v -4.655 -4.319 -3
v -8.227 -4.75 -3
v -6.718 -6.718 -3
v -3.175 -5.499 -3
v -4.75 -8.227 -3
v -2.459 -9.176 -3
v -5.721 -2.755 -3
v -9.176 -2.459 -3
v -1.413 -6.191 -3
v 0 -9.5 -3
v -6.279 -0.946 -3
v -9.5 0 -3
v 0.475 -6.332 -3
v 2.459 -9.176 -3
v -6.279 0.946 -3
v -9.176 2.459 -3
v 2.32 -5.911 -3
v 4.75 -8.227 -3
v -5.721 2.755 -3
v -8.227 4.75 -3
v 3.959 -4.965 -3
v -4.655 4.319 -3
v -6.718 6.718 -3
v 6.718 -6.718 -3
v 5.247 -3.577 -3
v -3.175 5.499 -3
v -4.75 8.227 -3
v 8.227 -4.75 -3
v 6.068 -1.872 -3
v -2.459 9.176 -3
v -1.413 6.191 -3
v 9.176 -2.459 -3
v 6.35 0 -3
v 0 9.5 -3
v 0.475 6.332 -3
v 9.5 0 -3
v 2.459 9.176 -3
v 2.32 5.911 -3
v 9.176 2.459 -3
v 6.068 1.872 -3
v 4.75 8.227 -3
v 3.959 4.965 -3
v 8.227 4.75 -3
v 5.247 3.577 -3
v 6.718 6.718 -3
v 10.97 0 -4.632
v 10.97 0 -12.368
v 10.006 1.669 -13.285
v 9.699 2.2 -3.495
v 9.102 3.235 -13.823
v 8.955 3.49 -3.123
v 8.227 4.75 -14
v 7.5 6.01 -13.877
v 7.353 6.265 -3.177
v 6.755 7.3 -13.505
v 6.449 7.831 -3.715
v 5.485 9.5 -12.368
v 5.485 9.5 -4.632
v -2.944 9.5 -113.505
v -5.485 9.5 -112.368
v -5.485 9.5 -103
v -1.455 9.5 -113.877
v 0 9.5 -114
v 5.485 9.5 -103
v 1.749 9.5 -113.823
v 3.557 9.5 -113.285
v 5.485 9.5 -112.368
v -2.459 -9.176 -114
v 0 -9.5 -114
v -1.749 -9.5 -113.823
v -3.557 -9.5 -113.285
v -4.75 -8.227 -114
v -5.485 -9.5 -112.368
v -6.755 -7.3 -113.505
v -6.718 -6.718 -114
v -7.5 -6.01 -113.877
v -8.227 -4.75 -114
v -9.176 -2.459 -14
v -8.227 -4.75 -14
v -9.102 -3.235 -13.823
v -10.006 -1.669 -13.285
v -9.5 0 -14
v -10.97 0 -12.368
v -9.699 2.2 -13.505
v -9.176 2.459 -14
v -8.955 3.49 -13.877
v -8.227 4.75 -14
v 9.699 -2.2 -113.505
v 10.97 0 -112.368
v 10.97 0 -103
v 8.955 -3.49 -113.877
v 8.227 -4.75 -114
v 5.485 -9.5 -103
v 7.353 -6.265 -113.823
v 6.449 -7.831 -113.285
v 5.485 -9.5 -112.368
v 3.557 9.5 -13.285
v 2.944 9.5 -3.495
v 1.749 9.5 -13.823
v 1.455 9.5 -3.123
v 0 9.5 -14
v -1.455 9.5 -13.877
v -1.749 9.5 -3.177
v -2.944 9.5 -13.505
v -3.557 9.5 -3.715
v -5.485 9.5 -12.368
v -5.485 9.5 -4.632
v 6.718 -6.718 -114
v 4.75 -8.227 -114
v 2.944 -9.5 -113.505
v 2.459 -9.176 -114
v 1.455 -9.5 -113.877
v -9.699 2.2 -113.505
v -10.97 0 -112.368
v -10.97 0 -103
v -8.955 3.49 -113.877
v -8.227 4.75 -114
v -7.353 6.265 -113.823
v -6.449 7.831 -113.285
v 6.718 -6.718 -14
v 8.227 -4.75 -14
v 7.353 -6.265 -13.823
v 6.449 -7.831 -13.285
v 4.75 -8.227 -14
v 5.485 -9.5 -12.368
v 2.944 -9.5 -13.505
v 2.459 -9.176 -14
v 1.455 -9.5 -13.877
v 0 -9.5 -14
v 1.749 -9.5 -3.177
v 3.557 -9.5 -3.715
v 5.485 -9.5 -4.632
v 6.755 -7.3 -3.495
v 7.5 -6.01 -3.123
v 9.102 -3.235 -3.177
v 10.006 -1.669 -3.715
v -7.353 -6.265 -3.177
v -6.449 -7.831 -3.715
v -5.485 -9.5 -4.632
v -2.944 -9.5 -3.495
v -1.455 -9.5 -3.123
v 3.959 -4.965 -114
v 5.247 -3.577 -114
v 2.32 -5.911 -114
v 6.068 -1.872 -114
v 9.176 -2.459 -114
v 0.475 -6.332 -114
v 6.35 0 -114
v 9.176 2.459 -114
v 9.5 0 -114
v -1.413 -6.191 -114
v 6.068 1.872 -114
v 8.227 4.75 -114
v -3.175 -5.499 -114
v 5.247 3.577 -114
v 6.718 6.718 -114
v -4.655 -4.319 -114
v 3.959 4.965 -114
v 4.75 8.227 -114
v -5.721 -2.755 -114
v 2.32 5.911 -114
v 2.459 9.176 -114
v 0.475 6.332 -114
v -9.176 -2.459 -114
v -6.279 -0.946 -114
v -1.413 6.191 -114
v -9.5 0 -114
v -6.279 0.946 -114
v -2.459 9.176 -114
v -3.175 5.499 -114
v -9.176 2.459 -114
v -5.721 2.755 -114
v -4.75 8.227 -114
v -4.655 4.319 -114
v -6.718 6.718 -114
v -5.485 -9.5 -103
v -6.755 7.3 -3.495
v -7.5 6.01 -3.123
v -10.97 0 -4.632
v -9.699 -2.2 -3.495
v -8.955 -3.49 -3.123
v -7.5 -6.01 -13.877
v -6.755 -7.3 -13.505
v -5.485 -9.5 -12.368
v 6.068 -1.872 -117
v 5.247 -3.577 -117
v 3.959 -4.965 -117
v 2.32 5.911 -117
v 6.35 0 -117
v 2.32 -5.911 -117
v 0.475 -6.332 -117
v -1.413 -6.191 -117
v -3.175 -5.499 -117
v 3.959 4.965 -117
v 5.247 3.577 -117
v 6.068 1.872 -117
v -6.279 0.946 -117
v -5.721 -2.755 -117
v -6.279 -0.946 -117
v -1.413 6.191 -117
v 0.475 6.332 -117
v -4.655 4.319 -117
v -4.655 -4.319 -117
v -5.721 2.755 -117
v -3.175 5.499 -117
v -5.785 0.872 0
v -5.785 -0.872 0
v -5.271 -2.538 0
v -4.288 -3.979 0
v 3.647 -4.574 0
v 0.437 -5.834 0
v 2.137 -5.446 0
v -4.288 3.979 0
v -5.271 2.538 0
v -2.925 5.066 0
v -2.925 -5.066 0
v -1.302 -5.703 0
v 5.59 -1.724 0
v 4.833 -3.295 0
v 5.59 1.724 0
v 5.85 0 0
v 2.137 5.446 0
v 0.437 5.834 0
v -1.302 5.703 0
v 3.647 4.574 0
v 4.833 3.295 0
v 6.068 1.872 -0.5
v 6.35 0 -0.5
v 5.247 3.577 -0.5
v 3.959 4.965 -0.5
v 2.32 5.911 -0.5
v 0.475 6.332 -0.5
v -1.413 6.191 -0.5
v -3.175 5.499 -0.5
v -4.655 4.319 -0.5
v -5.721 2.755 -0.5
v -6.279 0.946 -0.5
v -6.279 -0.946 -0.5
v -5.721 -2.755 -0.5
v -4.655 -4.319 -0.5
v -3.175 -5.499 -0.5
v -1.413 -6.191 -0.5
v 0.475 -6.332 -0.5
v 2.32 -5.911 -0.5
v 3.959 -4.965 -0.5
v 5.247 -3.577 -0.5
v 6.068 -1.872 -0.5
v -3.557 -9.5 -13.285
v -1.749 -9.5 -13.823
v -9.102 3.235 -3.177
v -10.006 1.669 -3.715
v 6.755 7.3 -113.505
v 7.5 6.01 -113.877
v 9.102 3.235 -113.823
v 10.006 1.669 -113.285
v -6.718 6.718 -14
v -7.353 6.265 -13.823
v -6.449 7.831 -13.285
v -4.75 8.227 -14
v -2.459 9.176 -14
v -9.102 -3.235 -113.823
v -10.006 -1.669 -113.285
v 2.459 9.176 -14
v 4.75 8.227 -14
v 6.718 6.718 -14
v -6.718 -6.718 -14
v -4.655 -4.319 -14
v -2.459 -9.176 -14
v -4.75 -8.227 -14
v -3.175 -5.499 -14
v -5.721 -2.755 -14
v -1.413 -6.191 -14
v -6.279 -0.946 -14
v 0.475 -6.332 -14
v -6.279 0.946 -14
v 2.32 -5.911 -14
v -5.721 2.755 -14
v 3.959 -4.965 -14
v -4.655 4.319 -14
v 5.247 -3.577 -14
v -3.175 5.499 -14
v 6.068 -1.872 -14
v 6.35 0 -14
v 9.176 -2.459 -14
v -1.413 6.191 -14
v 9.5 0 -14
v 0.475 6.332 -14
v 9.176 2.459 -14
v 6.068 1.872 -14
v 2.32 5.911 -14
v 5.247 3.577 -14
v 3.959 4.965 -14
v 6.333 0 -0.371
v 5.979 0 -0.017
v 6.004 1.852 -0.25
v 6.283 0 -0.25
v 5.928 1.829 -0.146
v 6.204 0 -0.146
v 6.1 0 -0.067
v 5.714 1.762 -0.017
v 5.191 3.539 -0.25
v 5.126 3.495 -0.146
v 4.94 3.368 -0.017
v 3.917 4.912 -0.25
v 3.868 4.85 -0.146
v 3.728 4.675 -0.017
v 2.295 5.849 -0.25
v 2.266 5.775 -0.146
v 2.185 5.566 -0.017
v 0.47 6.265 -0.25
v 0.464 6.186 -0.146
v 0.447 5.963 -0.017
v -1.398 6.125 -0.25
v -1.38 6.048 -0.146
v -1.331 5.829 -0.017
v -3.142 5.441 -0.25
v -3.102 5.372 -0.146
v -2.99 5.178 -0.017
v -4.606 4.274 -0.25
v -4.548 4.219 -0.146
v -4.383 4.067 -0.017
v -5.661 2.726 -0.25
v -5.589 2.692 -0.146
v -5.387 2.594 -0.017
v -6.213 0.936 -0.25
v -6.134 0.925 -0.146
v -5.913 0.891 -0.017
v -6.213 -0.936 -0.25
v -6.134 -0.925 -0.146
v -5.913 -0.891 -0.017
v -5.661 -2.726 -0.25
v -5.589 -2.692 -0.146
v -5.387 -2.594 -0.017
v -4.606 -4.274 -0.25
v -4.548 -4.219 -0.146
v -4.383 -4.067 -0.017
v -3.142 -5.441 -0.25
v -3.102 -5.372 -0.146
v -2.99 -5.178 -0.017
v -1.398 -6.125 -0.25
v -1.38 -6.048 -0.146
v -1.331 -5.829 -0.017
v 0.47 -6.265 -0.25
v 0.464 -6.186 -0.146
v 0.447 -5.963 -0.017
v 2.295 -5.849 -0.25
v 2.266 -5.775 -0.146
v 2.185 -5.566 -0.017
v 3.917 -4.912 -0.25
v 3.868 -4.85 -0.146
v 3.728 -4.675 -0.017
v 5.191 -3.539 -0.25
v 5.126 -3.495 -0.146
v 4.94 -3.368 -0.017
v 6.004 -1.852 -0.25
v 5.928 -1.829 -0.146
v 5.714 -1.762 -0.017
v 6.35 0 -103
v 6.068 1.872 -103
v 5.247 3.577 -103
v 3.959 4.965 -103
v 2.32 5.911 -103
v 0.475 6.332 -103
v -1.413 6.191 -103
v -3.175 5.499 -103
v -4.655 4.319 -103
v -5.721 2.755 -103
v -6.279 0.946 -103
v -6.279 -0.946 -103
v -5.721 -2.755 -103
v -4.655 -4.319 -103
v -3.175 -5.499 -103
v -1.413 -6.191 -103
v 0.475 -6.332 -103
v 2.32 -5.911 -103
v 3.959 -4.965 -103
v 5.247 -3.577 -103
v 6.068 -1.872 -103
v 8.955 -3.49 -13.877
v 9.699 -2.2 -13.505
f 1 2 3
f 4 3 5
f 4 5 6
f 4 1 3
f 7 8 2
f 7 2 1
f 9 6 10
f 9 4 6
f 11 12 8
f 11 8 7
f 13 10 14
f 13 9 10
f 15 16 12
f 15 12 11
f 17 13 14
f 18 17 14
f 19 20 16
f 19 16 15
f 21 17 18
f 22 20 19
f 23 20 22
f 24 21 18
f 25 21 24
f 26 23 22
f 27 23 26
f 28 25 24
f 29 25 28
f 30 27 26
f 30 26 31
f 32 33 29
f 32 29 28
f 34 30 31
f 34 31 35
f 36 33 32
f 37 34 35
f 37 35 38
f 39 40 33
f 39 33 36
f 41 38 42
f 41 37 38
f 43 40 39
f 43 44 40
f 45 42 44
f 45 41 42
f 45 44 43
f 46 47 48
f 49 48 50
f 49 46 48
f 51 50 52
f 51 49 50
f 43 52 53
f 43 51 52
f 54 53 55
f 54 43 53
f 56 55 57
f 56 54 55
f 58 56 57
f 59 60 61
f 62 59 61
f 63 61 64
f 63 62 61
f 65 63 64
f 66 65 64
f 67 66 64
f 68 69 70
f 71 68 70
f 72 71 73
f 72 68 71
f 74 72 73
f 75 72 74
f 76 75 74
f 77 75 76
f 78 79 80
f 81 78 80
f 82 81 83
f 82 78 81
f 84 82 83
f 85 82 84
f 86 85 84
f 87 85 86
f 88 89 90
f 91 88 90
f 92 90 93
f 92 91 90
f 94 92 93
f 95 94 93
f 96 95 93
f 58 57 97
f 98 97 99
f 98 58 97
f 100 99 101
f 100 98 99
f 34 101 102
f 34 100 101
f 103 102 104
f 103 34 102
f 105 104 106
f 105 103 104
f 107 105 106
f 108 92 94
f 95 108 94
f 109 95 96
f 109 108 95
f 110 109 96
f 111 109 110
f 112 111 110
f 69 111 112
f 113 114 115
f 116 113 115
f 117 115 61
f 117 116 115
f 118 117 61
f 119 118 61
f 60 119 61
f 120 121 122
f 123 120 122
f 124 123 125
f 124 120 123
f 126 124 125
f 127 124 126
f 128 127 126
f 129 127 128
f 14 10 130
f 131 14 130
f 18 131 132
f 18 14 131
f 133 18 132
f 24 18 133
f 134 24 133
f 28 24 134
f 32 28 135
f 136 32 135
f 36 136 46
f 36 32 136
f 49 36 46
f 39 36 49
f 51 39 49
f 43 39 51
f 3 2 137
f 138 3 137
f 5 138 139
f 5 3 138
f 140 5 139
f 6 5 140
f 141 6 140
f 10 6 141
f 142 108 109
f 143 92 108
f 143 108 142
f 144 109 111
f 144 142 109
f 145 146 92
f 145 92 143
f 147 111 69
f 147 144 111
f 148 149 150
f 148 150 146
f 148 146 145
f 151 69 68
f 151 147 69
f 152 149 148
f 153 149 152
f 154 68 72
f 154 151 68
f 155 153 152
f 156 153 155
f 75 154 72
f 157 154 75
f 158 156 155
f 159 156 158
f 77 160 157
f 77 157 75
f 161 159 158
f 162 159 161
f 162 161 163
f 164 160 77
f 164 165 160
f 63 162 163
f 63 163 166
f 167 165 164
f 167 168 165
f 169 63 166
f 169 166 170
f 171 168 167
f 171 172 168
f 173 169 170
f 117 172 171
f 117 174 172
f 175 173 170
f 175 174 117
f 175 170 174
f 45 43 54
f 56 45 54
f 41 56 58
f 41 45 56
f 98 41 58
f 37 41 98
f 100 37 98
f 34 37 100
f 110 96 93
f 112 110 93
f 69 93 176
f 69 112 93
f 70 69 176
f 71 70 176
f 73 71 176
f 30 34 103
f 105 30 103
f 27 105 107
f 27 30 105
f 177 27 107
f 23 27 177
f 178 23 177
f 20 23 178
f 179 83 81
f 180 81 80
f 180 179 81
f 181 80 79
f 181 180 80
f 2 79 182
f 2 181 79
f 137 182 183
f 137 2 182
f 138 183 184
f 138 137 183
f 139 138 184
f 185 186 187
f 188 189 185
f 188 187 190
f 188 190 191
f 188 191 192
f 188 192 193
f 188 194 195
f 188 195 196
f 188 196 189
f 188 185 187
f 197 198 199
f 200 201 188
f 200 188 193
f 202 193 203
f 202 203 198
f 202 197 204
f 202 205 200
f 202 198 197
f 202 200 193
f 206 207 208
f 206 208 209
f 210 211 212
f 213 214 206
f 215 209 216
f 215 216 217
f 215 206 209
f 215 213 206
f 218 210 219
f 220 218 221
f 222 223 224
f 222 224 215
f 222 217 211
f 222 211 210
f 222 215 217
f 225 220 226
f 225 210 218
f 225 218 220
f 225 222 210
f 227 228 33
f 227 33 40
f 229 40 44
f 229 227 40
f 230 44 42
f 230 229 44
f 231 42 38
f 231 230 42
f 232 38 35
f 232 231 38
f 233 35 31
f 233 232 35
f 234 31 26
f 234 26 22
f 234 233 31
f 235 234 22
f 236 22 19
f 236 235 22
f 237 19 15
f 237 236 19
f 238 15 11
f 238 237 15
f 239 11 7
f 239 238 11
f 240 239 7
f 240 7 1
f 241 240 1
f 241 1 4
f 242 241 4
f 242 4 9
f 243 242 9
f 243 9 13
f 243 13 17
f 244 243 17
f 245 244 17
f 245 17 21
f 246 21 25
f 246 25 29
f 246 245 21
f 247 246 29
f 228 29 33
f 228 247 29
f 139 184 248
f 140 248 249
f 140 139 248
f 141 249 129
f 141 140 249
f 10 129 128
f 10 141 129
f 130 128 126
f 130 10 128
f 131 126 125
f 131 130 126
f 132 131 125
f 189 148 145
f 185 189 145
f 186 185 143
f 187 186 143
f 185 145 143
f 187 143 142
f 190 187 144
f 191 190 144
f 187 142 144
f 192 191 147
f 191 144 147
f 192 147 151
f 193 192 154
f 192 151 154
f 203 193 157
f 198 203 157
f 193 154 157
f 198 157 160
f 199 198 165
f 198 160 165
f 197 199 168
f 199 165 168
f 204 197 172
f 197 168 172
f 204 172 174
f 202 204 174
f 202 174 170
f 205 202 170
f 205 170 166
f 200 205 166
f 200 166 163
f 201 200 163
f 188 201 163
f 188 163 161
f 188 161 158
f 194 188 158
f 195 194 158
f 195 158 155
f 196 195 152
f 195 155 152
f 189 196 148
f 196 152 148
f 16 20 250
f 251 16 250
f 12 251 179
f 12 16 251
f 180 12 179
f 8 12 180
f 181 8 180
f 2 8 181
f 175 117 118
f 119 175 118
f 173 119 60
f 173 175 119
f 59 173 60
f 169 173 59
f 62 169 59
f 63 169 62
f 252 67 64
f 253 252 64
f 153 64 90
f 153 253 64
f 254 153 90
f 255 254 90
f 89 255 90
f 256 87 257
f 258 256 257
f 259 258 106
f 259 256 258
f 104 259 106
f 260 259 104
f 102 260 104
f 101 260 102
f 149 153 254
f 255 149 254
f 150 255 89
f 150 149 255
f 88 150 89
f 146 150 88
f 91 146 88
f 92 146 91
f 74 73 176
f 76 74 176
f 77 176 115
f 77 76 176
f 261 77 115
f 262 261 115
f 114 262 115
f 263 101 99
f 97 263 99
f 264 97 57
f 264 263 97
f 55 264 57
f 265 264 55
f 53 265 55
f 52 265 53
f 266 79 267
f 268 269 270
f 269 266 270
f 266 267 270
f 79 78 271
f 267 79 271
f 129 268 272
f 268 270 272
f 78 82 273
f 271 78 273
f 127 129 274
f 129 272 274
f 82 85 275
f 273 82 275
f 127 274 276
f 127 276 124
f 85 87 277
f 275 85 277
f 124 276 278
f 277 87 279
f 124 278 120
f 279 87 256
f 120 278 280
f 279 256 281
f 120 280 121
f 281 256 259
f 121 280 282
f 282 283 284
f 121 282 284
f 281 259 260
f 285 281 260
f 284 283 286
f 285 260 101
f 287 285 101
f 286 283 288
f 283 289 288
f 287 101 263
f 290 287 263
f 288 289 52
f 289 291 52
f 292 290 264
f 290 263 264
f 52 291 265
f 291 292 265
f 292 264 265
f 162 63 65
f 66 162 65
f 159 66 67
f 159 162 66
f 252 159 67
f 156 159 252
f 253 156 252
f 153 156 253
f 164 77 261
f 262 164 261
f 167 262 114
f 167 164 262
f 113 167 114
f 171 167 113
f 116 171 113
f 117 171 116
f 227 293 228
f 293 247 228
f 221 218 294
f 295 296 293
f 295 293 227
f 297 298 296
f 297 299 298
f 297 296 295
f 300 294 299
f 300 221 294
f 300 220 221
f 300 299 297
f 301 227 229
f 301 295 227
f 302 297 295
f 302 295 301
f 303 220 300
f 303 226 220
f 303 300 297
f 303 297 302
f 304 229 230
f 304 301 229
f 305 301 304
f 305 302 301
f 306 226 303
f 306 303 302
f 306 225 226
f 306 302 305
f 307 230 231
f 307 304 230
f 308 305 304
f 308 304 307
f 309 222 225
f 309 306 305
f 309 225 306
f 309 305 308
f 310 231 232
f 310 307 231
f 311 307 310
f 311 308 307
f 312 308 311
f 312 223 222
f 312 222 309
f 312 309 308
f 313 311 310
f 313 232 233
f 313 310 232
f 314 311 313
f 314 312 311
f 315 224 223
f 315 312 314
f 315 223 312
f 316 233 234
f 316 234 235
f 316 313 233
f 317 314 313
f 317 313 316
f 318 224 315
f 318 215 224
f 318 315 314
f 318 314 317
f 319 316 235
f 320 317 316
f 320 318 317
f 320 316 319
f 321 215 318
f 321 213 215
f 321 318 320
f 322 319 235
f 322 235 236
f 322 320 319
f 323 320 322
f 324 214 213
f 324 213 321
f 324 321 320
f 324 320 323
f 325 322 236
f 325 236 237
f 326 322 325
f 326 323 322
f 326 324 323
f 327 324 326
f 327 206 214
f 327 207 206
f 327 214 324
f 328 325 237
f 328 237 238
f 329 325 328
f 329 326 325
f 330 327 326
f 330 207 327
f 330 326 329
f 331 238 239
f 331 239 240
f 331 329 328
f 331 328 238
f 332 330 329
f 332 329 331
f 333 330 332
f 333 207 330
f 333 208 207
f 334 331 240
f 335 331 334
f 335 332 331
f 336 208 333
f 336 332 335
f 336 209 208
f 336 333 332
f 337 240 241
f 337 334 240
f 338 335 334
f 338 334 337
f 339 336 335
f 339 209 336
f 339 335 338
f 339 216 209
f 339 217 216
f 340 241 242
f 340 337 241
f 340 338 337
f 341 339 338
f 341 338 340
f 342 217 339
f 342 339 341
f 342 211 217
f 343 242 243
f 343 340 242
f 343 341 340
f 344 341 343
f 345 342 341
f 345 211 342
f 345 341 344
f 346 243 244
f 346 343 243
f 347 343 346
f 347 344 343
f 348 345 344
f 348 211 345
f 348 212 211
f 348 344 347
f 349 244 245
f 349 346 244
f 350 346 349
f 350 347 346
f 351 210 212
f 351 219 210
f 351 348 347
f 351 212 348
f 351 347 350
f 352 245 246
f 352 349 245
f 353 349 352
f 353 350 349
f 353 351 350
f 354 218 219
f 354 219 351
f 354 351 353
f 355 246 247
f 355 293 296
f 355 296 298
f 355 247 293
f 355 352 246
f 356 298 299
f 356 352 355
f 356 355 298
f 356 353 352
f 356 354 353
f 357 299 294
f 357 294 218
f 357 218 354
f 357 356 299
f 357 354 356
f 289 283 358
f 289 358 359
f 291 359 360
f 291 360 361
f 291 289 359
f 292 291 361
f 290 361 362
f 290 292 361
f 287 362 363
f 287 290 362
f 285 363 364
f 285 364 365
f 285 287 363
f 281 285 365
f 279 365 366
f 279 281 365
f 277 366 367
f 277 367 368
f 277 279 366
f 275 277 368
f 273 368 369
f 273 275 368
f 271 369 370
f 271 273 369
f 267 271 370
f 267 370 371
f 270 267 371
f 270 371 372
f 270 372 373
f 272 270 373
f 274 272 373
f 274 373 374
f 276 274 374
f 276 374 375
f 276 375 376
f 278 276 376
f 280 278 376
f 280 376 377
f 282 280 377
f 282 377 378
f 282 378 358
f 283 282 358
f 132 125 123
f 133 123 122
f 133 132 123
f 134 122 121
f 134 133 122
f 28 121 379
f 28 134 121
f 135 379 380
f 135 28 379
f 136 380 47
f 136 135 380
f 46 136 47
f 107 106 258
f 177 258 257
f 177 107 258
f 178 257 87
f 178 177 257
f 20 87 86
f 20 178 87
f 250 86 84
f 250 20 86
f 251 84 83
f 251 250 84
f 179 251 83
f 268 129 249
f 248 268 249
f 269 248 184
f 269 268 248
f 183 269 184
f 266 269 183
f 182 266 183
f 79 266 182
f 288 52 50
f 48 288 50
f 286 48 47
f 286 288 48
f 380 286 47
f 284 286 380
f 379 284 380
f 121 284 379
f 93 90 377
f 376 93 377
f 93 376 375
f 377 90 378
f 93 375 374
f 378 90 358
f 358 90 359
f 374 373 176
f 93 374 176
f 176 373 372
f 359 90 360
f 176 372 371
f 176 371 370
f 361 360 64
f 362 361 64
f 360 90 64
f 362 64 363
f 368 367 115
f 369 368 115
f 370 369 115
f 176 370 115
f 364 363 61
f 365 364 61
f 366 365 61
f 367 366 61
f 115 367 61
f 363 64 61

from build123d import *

# Parameters (mm, degrees)
CROQUIS1_R              = 6.35
SALIENTE_EXTRUIR1_DEPTH = 117
CROQUIS2_R              = 6.35
SALIENTE_EXTRUIR2_DEPTH = 14
CROQUIS3_R              = 6.35
CORTAR_EXTRUIR1_DEPTH   = 3
CROQUIS4_R              = 25.644678888
CROQUIS4_R_2            = 9.5
CORTAR_EXTRUIR2_DEPTH   = 10
CORTAR_EXTRUIR2_DRAFT   = -42
CROQUIS5_R              = 21.393004687
CROQUIS5_R_2            = 9.5
CORTAR_EXTRUIR3_DEPTH   = 10
CORTAR_EXTRUIR3_DRAFT   = -42
SALIENTE_EXTRUIR3_DEPTH = 14
CORTAR_EXTRUIR4_START   = -3
CROQUIS7_R              = 6.35
CORTAR_EXTRUIR4_DEPTH   = 3
CROQUIS9_R              = 21.176137587
CROQUIS9_R_2            = 9.5
CORTAR_EXTRUIR5_DEPTH   = 3
CORTAR_EXTRUIR5_DRAFT   = -42
REDONDEO1_R             = 0.5


with BuildPart() as part:
    # Croquis1 → Saliente-Extruir1 (new body)
    with BuildSketch(Plane.XY):
        Circle(CROQUIS1_R)
    extrude(amount=-SALIENTE_EXTRUIR1_DEPTH)

    # Croquis2 → Saliente-Extruir2 (add)
    with BuildSketch(Plane.XY):
        Polygon((10.969655115, 0), (5.484827557, 9.5), (-5.484827557, 9.5), (-10.969655115, 0), (-5.484827557, -9.5), (5.484827557, -9.5), align=None)
        Circle(CROQUIS2_R, mode=Mode.SUBTRACT)
    extrude(amount=-SALIENTE_EXTRUIR2_DEPTH)

    # Croquis3 → Cortar-Extruir1 (cut)
    with BuildSketch(Plane.XY):
        Polygon((10.969655115, 0), (5.484827557, 9.5), (-5.484827557, 9.5), (-10.969655115, 0), (-5.484827557, -9.5), (5.484827557, -9.5), align=None)
        Circle(CROQUIS3_R, mode=Mode.SUBTRACT)
    extrude(amount=-CORTAR_EXTRUIR1_DEPTH, mode=Mode.SUBTRACT)


with BuildPart() as cortar_extruir2_tool:
    # Croquis4 → Cortar-Extruir2 (with draft: the straight prism first)
    with BuildSketch(Plane.XY.offset(-3)):
        Circle(CROQUIS4_R)
        Circle(CROQUIS4_R_2, mode=Mode.SUBTRACT)
    extrude(amount=-CORTAR_EXTRUIR2_DEPTH)
    # Cortar-Extruir2: the draft: its side faces are tilted about the plane it starts from
    cortar_extruir2_sides = [cortar_extruir2_tool.faces().sort_by_distance(p)[0] for p in [
        (-25.644678888, 0, -8),
        (-9.5, 0, -8),
    ]]
    draft(cortar_extruir2_sides, Plane.XY.offset(-3), CORTAR_EXTRUIR2_DRAFT)


with BuildPart() as part_1:
    add(part.part)

    # Cortar-Extruir2: cut by cortar_extruir2_tool
    add(cortar_extruir2_tool.part, mode=Mode.SUBTRACT)


with BuildPart() as cortar_extruir3_tool:
    # Croquis5 → Cortar-Extruir3 (with draft: the straight prism first)
    with BuildSketch(Plane(origin=(0, 0, -14), x_dir=(-1, 0, 0), z_dir=(0, 0, -1))):
        Circle(CROQUIS5_R)
        Circle(CROQUIS5_R_2, mode=Mode.SUBTRACT)
    extrude(amount=-CORTAR_EXTRUIR3_DEPTH)
    # Cortar-Extruir3: the draft: its side faces are tilted about the plane it starts from
    cortar_extruir3_sides = [cortar_extruir3_tool.faces().sort_by_distance(p)[0] for p in [
        (21.393004687, 0, -9),
        (9.5, 0, -9),
    ]]
    draft(cortar_extruir3_sides, Plane(origin=(0, 0, -14), x_dir=(-1, 0, 0), z_dir=(0, 0, -1)), CORTAR_EXTRUIR3_DRAFT)


with BuildPart() as part_2:
    add(part_1.part)

    # Cortar-Extruir3: cut by cortar_extruir3_tool
    add(cortar_extruir3_tool.part, mode=Mode.SUBTRACT)

    # Croquis6 → Saliente-Extruir3 (add)
    with BuildSketch(Plane(origin=(0, 0, -117), x_dir=(-1, 0, 0), z_dir=(0, 0, -1))):
        Polygon((10.969655115, 0), (5.484827557, 9.5), (-5.484827557, 9.5), (-10.969655115, 0), (-5.484827557, -9.5), (5.484827557, -9.5), align=None)
    extrude(amount=-SALIENTE_EXTRUIR3_DEPTH)

    # Croquis7 → Cortar-Extruir4 (cut)
    with BuildSketch(Plane(origin=(0, 0, -117), x_dir=(-1, 0, 0), z_dir=(0, 0, -1)).offset(CORTAR_EXTRUIR4_START)):
        Polygon((10.969655115, 0), (5.484827557, 9.5), (-5.484827557, 9.5), (-10.969655115, 0), (-5.484827557, -9.5), (5.484827557, -9.5), align=None)
        with Locations(Location((0, 0, 0), (0, 0, 180))):
            Circle(CROQUIS7_R, mode=Mode.SUBTRACT)
    extrude(amount=CORTAR_EXTRUIR4_DEPTH, mode=Mode.SUBTRACT)


with BuildPart() as cortar_extruir5_tool:
    # Croquis9 → Cortar-Extruir5 (with draft: the straight prism first)
    with BuildSketch(Plane(origin=(0, 0, -114), x_dir=(-1, 0, 0), z_dir=(0, 0, -1))):
        Circle(CROQUIS9_R)
        Circle(CROQUIS9_R_2, mode=Mode.SUBTRACT)
    extrude(amount=-CORTAR_EXTRUIR5_DEPTH)
    # Cortar-Extruir5: the draft: its side faces are tilted about the plane it starts from
    cortar_extruir5_sides = [cortar_extruir5_tool.faces().sort_by_distance(p)[0] for p in [
        (21.176137587, 0, -112.5),
        (9.5, 0, -112.5),
    ]]
    draft(cortar_extruir5_sides, Plane(origin=(0, 0, -114), x_dir=(-1, 0, 0), z_dir=(0, 0, -1)), CORTAR_EXTRUIR5_DRAFT)


with BuildPart() as part_3:
    add(part_2.part)

    # Cortar-Extruir5: cut by cortar_extruir5_tool
    add(cortar_extruir5_tool.part, mode=Mode.SUBTRACT)

    # Redondeo1
    redondeo1_edges = [part_3.edges().sort_by_distance(p)[0] for p in [
        (-6.35, 0, 0),
    ]]
    fillet(redondeo1_edges, radius=REDONDEO1_R)


solid = part_3.part
